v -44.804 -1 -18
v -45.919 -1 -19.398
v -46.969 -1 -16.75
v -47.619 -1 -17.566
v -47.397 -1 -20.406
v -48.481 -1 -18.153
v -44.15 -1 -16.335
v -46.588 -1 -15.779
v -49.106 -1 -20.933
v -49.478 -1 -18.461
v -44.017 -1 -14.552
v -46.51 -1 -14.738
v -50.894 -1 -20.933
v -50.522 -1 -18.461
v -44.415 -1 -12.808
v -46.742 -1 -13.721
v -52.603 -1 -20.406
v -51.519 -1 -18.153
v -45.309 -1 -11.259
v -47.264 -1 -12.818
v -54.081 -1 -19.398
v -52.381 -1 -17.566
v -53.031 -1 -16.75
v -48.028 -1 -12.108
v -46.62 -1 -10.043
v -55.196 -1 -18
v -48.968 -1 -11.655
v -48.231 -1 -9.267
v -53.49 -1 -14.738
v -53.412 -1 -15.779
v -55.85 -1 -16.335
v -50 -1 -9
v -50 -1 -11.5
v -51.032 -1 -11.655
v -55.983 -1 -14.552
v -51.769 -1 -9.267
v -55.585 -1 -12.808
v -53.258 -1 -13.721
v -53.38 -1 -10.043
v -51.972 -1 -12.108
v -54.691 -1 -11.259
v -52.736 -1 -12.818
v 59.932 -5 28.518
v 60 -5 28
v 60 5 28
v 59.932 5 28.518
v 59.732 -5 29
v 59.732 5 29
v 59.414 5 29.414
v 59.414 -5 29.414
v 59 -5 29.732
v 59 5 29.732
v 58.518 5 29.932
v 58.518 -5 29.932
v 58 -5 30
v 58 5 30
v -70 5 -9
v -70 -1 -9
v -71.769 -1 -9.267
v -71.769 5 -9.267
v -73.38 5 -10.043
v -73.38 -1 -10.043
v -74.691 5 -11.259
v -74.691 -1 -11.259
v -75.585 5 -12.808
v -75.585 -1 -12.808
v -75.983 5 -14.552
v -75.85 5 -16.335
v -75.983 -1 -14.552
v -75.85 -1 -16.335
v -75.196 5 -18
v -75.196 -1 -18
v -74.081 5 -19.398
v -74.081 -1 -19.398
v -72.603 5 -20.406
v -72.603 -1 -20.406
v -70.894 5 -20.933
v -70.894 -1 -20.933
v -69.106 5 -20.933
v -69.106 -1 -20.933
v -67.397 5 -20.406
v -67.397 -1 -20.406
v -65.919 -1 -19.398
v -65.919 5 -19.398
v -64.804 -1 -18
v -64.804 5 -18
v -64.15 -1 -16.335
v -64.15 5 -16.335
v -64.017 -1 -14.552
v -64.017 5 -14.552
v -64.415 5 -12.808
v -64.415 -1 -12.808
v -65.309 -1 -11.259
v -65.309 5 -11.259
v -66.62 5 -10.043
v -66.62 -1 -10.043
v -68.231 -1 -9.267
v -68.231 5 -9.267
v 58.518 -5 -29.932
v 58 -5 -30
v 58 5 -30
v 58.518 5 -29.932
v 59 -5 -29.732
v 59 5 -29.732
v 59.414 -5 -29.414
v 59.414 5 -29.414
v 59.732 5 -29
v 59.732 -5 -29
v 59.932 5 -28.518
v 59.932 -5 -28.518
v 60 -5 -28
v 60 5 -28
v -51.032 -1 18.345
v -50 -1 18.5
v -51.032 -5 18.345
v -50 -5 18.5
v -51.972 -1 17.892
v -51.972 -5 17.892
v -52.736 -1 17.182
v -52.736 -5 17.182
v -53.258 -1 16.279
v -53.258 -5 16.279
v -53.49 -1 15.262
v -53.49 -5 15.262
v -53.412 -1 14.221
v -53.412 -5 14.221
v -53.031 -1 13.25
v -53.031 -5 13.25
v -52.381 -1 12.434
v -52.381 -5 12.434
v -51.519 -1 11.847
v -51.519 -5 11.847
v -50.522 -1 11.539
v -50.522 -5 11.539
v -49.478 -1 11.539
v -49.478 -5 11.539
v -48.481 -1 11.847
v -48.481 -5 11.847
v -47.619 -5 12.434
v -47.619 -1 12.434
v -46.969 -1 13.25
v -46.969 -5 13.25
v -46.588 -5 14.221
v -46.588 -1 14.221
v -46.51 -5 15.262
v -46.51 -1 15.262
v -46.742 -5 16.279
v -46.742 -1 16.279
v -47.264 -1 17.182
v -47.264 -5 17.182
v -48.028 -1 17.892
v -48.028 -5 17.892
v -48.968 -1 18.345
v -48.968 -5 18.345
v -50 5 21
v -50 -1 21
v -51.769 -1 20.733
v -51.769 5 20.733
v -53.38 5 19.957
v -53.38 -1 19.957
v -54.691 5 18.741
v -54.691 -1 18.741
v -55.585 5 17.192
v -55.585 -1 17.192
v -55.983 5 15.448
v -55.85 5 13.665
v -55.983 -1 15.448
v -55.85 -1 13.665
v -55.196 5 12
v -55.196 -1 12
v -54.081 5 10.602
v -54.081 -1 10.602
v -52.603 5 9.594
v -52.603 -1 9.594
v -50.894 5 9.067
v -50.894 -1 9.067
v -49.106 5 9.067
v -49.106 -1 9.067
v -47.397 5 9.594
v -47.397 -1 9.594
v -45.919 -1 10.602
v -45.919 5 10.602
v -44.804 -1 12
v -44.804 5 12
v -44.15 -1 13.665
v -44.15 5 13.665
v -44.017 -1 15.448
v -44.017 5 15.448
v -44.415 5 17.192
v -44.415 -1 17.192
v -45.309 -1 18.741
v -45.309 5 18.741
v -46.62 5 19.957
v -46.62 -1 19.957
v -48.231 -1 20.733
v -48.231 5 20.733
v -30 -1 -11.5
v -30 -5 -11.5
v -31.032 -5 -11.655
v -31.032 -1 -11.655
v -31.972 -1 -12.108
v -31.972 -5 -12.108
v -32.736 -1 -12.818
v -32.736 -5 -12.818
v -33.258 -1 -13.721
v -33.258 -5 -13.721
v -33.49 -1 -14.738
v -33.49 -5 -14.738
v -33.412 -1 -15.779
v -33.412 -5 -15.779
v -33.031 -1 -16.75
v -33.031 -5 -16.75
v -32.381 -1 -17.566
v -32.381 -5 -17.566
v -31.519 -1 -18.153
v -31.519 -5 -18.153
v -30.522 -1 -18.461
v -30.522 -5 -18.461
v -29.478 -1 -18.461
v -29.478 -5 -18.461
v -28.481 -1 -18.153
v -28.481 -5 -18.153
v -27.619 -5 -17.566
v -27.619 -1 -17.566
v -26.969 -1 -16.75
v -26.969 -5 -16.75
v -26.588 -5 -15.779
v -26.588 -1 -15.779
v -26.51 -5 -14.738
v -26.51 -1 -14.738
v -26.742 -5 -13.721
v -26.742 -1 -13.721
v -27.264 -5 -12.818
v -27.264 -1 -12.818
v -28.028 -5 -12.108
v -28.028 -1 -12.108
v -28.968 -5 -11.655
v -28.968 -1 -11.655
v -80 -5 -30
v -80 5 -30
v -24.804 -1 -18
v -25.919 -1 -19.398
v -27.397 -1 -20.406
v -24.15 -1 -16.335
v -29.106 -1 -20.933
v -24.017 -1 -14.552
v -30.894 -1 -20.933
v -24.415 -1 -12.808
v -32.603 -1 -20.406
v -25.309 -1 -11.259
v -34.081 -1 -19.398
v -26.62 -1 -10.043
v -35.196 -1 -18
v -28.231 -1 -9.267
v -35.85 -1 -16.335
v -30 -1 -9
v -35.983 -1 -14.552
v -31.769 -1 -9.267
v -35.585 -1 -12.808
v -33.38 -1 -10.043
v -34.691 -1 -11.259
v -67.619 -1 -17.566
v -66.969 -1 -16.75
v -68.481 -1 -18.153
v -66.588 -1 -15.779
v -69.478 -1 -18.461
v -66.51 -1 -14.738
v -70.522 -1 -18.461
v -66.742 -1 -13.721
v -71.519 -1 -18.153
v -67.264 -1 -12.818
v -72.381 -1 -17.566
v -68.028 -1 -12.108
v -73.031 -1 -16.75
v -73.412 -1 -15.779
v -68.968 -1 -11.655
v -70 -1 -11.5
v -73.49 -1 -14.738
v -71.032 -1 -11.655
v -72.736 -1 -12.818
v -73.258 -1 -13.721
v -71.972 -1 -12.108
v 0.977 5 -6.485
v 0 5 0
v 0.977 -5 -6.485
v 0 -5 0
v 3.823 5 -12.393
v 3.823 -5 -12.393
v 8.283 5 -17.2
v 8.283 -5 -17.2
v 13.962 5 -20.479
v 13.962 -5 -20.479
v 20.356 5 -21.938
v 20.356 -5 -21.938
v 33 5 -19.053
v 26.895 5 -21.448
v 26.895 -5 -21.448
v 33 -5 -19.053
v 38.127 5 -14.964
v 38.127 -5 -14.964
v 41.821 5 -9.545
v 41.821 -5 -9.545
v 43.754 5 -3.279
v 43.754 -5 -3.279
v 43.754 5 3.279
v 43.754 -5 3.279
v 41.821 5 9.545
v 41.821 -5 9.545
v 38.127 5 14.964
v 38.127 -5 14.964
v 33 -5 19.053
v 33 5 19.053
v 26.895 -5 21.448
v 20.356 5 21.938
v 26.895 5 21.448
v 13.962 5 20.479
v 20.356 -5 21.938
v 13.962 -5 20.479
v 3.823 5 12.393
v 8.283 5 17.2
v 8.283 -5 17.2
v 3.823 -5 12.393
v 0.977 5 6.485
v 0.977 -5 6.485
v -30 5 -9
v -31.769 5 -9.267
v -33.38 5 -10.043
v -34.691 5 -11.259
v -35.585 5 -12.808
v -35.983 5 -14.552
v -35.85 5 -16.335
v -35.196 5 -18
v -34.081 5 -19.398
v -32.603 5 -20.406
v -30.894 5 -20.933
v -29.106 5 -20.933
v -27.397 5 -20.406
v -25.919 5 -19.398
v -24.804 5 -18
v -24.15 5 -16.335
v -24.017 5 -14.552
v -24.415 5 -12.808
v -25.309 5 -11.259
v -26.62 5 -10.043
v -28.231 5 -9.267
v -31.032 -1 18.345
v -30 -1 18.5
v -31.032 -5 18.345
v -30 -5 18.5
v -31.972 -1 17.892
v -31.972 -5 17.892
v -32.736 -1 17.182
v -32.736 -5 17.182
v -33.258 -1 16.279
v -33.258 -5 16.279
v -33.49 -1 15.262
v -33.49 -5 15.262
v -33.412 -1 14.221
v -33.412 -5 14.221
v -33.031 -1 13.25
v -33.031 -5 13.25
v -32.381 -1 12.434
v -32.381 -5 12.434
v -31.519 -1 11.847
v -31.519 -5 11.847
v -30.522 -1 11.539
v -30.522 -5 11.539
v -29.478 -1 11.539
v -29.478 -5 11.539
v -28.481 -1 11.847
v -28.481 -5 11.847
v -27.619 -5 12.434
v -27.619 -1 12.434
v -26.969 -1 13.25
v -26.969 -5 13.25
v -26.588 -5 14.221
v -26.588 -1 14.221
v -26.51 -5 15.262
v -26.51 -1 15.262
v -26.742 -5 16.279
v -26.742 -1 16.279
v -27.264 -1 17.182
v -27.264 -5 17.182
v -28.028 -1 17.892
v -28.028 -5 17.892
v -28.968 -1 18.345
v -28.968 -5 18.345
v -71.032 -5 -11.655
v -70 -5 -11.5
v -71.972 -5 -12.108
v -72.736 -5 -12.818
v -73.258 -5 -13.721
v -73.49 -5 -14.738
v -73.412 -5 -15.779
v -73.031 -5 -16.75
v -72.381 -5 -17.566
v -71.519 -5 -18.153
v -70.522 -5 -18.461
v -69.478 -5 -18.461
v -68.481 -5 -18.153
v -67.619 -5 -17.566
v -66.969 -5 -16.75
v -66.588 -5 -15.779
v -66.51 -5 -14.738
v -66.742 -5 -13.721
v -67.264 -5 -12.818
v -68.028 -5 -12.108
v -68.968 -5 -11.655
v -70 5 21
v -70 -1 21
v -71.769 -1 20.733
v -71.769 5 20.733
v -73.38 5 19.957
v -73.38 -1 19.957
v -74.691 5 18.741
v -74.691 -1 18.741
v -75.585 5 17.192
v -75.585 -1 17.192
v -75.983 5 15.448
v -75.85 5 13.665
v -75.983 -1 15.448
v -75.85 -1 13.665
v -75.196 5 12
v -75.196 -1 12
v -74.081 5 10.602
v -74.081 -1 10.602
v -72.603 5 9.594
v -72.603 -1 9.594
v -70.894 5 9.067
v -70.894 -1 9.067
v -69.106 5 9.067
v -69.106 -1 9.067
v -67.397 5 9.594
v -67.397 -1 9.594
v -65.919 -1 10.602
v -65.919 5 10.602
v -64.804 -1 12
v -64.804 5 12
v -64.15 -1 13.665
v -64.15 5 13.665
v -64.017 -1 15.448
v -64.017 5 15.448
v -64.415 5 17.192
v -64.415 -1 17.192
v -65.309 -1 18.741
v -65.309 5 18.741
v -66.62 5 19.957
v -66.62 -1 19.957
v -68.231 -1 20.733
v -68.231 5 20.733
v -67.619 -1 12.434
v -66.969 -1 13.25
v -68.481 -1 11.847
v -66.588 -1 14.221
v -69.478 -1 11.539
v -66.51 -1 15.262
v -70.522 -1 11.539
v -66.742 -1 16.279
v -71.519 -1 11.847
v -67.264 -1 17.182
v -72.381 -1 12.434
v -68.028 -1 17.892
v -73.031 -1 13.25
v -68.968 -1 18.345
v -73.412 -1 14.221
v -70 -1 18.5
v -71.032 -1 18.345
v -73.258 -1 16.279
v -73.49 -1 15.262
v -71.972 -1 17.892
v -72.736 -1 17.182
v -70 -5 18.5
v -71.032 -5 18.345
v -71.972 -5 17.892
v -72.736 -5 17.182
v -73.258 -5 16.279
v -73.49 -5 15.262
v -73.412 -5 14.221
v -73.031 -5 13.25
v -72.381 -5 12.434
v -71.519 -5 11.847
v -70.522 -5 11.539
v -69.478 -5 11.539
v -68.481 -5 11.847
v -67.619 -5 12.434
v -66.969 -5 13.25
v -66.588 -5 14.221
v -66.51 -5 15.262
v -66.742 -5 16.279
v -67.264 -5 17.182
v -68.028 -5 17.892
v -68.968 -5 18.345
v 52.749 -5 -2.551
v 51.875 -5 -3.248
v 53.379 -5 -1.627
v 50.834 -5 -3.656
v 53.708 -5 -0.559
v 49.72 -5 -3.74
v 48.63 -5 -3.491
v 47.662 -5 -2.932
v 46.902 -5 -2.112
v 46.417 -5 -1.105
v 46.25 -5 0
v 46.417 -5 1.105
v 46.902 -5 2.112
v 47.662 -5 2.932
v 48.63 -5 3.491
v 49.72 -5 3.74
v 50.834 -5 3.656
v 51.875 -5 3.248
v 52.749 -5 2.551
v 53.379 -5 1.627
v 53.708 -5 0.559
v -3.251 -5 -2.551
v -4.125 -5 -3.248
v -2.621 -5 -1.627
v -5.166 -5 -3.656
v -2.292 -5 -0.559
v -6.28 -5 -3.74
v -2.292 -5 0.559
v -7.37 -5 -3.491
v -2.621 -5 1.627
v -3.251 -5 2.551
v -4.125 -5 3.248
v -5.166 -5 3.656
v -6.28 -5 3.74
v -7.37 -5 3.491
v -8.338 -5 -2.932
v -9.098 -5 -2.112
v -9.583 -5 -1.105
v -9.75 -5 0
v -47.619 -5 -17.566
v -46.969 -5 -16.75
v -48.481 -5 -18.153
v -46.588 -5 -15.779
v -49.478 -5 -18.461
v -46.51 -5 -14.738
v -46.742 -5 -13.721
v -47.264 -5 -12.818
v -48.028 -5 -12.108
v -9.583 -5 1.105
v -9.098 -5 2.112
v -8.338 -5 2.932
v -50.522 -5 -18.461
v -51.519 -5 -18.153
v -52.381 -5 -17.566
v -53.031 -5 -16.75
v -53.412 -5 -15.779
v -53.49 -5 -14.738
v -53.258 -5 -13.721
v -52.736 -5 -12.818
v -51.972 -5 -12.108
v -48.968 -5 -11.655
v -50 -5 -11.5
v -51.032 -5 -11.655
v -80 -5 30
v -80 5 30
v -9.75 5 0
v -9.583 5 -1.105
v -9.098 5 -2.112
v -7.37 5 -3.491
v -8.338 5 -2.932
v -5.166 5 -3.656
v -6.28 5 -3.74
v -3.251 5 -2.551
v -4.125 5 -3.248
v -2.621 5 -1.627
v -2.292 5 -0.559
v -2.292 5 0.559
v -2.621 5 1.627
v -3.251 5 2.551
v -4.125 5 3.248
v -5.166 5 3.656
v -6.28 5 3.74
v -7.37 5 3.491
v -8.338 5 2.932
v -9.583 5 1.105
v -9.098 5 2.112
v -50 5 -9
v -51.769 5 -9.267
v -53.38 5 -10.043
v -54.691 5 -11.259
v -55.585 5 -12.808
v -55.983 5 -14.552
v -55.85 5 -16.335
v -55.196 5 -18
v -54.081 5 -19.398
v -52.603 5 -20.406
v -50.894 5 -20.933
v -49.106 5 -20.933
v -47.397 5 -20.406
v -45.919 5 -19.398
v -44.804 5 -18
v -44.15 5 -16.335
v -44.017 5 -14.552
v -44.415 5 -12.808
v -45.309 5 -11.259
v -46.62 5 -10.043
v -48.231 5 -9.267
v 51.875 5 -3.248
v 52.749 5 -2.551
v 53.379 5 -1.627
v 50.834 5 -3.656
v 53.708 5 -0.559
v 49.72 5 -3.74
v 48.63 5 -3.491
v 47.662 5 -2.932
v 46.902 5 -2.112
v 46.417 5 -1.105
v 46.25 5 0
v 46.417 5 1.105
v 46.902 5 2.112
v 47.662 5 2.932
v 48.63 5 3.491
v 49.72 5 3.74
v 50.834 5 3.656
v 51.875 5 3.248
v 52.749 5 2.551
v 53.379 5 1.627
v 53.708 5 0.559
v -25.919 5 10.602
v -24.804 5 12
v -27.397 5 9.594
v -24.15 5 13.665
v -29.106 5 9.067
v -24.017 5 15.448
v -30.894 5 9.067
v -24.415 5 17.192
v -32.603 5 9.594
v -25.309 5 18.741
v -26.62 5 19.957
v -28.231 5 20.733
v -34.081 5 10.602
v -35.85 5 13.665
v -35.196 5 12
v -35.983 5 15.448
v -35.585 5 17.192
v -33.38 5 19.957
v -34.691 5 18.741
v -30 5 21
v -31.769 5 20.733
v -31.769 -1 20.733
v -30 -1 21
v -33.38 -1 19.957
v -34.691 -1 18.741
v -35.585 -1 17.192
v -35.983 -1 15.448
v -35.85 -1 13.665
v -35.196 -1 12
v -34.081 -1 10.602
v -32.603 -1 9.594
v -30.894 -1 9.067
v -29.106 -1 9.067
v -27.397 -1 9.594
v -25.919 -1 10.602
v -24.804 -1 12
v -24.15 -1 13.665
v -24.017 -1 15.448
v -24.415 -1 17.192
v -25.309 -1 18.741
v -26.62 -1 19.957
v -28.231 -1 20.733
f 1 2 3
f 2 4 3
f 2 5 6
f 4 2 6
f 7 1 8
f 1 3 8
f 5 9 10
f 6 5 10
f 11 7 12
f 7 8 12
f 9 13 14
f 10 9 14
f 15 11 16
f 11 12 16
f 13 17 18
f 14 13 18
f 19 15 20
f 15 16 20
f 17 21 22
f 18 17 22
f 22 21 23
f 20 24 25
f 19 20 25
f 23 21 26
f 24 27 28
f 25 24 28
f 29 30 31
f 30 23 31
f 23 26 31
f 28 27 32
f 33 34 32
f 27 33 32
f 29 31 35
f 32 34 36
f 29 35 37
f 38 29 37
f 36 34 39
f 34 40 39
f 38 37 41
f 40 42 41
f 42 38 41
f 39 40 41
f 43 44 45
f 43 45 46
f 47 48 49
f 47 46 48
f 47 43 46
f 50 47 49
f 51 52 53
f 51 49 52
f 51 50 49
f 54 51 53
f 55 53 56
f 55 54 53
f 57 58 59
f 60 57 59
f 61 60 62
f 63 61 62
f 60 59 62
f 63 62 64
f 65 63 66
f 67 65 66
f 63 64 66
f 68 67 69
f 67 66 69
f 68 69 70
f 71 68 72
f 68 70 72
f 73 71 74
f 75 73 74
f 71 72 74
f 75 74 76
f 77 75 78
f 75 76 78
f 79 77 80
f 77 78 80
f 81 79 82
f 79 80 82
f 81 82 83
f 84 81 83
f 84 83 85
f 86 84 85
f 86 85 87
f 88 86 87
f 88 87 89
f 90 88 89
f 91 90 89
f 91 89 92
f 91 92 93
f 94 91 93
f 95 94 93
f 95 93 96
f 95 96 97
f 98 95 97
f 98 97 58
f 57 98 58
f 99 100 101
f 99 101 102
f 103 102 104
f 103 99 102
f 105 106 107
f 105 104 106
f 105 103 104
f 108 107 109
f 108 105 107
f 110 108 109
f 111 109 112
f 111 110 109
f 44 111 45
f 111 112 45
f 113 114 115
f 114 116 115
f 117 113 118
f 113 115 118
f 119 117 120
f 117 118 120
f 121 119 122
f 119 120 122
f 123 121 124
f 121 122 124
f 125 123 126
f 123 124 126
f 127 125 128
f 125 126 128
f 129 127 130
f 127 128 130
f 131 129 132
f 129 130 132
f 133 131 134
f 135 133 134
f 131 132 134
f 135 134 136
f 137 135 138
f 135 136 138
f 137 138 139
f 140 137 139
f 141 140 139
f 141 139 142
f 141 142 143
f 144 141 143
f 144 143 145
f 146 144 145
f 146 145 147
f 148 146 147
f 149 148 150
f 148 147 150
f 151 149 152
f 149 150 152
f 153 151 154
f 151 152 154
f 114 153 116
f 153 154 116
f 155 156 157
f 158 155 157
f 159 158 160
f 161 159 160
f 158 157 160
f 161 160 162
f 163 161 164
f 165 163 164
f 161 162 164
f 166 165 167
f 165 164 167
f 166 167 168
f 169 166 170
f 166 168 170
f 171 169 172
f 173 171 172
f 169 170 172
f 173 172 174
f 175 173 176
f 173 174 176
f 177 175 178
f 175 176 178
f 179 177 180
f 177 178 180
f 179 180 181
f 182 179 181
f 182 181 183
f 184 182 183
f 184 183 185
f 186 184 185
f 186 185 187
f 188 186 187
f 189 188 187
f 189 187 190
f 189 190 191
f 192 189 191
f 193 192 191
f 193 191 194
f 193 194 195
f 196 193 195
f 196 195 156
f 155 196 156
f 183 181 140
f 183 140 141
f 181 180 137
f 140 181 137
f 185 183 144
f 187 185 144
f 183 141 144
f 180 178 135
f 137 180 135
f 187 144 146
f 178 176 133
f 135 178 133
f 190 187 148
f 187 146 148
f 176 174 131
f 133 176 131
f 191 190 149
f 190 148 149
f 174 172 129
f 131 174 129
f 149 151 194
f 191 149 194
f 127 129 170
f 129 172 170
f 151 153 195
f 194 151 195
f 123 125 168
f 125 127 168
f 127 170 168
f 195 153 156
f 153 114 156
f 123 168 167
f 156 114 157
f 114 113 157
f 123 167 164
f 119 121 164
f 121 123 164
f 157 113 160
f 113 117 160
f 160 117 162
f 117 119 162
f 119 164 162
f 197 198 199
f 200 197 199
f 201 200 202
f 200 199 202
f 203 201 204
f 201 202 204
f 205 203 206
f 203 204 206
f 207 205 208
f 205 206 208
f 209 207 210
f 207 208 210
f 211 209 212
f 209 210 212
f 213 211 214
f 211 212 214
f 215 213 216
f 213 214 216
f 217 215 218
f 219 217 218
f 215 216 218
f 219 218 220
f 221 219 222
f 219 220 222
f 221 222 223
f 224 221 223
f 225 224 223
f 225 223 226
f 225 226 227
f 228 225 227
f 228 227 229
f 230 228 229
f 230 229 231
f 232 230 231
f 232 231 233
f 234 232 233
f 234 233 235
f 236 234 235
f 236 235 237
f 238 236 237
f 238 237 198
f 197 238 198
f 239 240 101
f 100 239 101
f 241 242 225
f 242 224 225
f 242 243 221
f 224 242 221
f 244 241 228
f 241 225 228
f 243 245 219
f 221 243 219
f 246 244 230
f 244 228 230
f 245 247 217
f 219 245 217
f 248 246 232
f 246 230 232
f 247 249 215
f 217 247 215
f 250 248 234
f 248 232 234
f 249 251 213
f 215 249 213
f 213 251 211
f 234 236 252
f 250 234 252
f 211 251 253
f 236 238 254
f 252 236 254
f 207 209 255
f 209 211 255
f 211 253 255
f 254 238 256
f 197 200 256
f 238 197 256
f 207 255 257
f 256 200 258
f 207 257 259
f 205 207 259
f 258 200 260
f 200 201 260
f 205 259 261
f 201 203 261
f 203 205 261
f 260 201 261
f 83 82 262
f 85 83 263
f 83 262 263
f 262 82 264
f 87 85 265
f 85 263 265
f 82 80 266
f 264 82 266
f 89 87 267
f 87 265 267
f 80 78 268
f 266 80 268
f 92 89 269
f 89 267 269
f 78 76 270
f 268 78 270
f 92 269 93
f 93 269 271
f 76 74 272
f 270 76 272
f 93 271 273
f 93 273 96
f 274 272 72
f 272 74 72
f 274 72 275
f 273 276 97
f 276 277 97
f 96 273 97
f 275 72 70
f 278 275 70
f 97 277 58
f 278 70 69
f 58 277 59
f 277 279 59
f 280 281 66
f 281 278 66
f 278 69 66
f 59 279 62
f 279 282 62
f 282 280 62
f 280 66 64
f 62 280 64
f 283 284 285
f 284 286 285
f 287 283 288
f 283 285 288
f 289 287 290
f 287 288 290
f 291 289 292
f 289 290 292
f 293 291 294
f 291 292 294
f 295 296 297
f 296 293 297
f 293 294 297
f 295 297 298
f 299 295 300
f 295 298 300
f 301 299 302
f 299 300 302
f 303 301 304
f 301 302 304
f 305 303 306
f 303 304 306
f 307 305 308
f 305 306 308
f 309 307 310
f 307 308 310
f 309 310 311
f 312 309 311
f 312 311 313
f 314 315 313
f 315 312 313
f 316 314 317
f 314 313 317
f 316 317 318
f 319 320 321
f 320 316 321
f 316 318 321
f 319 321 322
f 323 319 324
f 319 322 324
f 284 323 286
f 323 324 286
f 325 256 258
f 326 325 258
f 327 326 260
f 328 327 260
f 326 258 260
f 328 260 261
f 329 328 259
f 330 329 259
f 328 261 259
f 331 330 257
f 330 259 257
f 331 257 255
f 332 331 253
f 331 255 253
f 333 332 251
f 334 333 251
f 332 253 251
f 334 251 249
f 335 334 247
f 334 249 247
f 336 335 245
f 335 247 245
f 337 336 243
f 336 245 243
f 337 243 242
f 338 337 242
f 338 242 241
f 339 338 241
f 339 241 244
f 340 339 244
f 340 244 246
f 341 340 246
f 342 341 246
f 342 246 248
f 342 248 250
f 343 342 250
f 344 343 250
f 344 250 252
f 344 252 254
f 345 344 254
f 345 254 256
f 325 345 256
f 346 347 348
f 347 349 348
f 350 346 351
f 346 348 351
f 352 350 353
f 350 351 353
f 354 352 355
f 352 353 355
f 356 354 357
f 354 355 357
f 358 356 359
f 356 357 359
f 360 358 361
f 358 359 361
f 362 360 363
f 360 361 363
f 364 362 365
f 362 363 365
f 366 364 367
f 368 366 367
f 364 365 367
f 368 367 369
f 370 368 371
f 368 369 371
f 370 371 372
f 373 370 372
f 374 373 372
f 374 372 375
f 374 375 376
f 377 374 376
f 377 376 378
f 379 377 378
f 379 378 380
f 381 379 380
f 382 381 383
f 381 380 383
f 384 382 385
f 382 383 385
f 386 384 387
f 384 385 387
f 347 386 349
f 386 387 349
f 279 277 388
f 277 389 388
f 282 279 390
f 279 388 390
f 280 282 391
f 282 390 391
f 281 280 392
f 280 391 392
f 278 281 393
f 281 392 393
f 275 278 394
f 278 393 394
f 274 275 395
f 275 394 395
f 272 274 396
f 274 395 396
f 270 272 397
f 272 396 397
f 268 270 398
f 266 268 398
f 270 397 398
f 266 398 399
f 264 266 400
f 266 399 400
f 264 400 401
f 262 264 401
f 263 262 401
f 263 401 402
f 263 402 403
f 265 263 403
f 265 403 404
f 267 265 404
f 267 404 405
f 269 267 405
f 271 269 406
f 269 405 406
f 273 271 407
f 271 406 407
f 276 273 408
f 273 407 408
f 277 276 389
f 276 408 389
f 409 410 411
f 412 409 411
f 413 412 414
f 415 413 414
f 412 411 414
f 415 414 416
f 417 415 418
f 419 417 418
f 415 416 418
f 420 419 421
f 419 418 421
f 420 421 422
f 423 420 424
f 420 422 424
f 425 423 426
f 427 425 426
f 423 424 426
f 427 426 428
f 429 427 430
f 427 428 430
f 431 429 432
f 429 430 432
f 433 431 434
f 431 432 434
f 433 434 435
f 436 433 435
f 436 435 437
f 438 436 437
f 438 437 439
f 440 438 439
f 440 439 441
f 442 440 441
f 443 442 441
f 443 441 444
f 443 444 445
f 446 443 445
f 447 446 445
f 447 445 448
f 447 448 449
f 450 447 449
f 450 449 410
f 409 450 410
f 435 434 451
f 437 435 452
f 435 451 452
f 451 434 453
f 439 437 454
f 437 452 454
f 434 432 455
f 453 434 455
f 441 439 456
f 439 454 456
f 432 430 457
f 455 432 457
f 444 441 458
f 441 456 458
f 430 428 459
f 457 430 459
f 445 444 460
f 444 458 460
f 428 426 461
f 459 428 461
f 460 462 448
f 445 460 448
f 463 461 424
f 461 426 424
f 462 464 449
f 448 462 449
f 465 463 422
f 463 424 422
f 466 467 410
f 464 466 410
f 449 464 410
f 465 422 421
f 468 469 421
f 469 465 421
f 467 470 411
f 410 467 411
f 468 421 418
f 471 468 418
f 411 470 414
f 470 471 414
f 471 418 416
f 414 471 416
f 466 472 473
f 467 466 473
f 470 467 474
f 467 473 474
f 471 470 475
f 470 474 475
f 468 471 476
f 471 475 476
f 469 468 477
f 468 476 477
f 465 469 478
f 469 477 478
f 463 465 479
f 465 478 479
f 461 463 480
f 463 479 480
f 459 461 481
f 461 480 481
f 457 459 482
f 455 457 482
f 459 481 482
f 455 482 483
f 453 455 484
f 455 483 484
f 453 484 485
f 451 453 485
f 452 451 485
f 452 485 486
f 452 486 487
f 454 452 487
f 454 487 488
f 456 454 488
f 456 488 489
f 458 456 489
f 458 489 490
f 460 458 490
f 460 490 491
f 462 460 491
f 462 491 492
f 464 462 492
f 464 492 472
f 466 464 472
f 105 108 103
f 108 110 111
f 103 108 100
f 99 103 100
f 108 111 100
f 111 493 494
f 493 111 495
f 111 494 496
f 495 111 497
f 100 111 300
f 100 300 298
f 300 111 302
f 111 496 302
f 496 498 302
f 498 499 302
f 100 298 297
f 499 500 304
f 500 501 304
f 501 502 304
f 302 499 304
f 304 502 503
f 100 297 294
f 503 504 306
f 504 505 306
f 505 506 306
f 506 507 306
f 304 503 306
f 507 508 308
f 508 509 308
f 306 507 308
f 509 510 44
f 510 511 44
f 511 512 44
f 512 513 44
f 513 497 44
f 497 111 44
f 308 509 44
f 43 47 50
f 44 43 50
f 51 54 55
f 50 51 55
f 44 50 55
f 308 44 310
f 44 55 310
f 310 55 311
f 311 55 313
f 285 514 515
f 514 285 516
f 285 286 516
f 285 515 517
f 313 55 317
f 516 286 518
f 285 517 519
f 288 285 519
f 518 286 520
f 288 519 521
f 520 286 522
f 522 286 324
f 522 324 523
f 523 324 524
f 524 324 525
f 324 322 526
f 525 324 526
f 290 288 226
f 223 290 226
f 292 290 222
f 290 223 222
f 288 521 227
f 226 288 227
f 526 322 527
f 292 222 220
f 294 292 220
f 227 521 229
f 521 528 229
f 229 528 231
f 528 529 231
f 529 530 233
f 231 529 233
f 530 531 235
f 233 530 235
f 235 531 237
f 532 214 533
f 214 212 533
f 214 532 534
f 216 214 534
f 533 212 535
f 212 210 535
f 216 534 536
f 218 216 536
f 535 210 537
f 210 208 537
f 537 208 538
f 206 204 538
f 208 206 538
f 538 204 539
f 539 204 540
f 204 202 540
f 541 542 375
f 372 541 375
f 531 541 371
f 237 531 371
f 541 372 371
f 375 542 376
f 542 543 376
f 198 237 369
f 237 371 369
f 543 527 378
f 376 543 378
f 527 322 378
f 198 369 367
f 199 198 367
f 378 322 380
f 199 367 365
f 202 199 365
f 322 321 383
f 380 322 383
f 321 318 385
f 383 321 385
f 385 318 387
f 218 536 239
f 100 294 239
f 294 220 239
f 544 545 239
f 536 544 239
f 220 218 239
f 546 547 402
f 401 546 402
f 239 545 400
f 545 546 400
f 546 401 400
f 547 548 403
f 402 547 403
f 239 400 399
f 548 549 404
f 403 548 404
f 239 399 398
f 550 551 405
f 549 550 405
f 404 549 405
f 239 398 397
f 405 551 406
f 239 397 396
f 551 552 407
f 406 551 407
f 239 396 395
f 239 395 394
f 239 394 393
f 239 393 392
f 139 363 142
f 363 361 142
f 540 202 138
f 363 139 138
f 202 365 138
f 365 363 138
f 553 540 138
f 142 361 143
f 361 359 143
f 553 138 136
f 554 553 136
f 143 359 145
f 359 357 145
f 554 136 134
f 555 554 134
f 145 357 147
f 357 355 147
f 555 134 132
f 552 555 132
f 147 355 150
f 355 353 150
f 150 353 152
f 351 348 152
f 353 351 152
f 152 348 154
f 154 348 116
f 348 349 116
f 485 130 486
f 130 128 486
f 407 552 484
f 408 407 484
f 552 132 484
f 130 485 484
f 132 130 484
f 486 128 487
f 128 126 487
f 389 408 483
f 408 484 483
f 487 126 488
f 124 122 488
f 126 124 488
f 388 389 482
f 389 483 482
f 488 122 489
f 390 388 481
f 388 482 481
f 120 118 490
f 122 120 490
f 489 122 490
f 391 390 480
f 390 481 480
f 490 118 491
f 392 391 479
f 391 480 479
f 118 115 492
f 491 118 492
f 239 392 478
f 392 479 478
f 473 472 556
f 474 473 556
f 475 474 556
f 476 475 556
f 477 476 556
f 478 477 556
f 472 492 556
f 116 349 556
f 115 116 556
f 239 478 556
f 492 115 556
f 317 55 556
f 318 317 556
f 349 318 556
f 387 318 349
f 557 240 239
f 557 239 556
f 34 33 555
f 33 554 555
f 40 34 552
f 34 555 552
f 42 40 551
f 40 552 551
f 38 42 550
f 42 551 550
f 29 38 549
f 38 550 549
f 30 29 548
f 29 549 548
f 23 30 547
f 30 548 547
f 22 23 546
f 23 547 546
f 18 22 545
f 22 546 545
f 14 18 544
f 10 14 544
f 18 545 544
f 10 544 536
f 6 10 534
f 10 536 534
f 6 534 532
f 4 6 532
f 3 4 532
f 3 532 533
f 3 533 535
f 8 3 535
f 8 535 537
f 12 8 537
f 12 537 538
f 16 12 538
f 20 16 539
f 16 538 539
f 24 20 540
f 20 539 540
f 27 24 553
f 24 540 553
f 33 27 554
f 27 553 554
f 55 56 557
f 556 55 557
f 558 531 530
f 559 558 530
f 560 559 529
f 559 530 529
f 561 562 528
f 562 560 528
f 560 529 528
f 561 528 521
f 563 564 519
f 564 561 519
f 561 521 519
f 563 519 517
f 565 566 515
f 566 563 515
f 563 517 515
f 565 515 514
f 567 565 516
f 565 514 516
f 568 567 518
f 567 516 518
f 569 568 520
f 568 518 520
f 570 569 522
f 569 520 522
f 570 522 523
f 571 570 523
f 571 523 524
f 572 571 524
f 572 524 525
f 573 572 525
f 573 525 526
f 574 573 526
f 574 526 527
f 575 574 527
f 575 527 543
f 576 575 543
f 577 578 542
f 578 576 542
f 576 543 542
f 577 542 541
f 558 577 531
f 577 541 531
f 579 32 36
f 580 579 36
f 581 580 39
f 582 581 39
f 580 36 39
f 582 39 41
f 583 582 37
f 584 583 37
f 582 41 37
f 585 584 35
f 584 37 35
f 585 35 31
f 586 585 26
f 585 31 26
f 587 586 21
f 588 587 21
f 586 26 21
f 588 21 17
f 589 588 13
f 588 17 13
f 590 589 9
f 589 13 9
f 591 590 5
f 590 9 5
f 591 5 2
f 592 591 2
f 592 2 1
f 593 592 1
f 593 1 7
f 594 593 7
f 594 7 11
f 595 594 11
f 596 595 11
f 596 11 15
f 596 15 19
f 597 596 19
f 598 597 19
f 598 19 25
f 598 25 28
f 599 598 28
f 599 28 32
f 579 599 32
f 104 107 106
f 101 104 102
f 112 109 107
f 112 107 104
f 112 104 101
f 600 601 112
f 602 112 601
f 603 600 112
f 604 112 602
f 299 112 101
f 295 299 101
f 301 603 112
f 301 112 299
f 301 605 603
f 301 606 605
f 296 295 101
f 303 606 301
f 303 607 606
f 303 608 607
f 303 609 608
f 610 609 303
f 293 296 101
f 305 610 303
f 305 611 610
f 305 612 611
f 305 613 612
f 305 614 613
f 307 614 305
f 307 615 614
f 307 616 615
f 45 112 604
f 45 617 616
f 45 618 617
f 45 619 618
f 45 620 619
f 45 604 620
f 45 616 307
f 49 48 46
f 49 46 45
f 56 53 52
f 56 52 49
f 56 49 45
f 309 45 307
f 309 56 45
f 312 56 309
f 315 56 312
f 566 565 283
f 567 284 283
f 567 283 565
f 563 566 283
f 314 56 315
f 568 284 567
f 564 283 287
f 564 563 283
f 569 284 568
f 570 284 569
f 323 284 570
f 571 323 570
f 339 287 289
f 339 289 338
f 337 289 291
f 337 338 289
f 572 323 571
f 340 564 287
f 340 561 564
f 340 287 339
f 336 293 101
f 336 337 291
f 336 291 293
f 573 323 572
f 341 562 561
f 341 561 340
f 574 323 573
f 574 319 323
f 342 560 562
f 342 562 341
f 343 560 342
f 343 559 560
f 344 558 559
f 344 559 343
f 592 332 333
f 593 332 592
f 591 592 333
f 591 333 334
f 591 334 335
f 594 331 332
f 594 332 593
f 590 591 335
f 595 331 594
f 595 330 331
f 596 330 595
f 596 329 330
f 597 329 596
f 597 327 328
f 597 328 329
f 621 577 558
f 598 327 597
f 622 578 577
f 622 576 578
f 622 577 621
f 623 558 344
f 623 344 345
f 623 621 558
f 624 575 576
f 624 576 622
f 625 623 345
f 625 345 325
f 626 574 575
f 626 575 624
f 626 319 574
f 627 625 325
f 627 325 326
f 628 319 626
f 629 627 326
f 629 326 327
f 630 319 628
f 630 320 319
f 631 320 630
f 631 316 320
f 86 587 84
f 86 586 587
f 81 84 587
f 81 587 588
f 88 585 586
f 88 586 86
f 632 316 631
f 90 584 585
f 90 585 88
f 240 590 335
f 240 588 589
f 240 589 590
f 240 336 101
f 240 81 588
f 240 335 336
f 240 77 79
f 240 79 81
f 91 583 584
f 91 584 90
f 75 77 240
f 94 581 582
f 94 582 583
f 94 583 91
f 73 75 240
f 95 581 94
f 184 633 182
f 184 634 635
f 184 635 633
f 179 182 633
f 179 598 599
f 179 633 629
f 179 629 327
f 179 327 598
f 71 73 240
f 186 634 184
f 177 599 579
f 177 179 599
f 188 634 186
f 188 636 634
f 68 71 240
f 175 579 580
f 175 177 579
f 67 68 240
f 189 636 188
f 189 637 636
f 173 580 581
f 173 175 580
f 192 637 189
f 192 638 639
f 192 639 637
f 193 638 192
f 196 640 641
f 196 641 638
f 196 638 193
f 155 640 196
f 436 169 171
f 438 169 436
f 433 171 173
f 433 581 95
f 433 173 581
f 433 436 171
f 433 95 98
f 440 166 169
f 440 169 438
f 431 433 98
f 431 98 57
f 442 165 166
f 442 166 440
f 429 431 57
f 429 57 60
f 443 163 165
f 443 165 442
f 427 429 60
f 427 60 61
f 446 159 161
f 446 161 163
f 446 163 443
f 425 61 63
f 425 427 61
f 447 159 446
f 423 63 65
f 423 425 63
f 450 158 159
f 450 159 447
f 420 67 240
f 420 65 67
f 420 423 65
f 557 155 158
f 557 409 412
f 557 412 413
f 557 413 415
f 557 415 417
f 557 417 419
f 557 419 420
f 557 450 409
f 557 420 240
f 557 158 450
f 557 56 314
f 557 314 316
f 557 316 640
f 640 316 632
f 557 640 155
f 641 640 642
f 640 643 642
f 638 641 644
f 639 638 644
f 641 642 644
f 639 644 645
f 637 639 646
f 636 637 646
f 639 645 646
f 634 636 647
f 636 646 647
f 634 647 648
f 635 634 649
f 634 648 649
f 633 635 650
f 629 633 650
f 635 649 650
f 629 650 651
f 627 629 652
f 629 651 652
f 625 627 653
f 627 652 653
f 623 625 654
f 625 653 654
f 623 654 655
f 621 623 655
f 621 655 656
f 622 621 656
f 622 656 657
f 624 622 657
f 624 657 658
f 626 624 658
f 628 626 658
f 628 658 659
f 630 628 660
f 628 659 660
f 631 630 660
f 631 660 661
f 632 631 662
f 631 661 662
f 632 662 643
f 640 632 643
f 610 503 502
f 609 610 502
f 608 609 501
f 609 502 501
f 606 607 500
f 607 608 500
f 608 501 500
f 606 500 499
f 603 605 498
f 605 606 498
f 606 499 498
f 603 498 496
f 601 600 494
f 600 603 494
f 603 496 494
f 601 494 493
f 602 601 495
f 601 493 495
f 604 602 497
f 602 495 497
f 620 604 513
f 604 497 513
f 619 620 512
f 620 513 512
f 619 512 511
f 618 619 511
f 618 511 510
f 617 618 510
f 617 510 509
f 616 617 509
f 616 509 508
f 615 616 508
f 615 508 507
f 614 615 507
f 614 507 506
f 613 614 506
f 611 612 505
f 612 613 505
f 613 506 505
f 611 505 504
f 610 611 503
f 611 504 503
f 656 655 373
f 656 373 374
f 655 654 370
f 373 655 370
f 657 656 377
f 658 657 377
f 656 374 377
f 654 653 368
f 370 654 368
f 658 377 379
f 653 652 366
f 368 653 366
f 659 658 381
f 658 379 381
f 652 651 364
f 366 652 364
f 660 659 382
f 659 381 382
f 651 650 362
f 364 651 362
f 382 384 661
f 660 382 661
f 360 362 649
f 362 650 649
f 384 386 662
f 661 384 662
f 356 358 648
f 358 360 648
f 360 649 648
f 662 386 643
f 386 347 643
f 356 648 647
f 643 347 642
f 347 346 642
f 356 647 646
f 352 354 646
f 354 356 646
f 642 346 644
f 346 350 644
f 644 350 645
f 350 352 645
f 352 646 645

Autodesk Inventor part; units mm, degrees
ref_plane "YZ Plane" through (0, 0, 0) normal (1, 0, 0) x (0, 1, 0)
ref_plane "XZ Plane" through (0, 0, 0) normal (0, 1, 0) x (-1, 0, 0)
ref_plane "XY Plane" through (0, 0, 0) normal (0, 0, 1) x (1, 0, 0)
sketch "Sketch6" plane through (0, -5, 0) normal (0, -1, 0) x (1, 0, 0)
  circle A0 centre (-30, 15) radius 3.25 projected
  circle A1 centre (-30, -15) radius 3.25 projected
  circle A2 centre (-50, -15) radius 3.25 projected
  circle A3 centre (-50, 15) radius 3.25 projected
  circle A4 centre (-70, 15) radius 3.25 projected
  circle A5 centre (-70, -15) radius 3.25 projected
  point P0 (0, 0)
sketch "Sketch1" plane through (0, 0, 0) normal (0, 1, 0) x (-1, 0, 0)
  line L0 (-98, 30) -> (98, 30)
  line L1 (100, 28) -> (100, -28)
  line L2 (98, -30) -> (-98, -30)
  line L3 (-100, -28) -> (-100, 28)
  line L4 (-100, 30) -> (100, -30) construction
  line L5 (100, 30) -> (-100, -30) construction
  arc A0 (-98, 30) -> (-100, 28) centre (-98, 28) ccw
  arc A1 (100, 28) -> (98, 30) centre (98, 28) ccw
  arc A2 (98, -30) -> (100, -28) centre (98, -28) ccw
  arc A3 (-100, -28) -> (-98, -30) centre (-98, -28) ccw
  circle A4 centre (-22, 0) radius 22
  circle A5 centre (-50, 0) radius 3.75
  circle A6 centre (6, 0) radius 3.75
  circle A7 centre (30, 15) radius 3.25
  circle A8 centre (50, 15) radius 3.25
  circle A9 centre (70, 15) radius 3.25
  circle A10 centre (30, -15) radius 3.25
  circle A11 centre (50, -15) radius 3.25
  circle A12 centre (70, -15) radius 3.25
  point P0 (0, 0)
  point P1 (-100, 0)
  dimension "d0" = 60
  dimension "d1" = 200
  dimension "d2" = 2
  dimension "d3" = 44
  dimension "d4" = 56
  dimension "d5" = 28
  dimension "d6" = 7.5
  dimension "d7" = 7.5
  dimension "d8" = 50
  dimension "d9" = 6.5
  dimension "d10" = 6.5
  dimension "d11" = 6.5
  dimension "d12" = 6.5
  dimension "d13" = 6.5
  dimension "d14" = 6.5
  dimension "d15" = 15
  dimension "d16" = 30
  dimension "d17" = 30
  dimension "d18" = 20
  dimension "d19" = 20
extrude "Plate1" add sketch "Sketch1" along normal mid plane 10 contours L0 A1 L1 A2 L2 A3 L3 A0 | A7 | A8 | A9 | A10 | A11 | A12
sketch "Sketch2" plane through (0, 5, 0) normal (0, 1, 0) x (1, 0, 0)
  line L0 (98, -30) -> (-98, -30) projected
  line L1 (100, 30) -> (60, 30)
  line L2 (60, 30) -> (60, -30)
  line L3 (60, -30) -> (100, -30)
  line L4 (100, -30) -> (100, 30)
  line L5 (100, 28) -> (100, -28) projected
  line L6 (-98, 30) -> (98, 30) projected
  point P0 (0, 0)
  dimension "d21" = 40
extrude "Cut1" cut sketch "Sketch2" against normal blind 10
fillet "Corner Round1" radius 2 2 edges at (60, 0, -30) (60, 0, 30)
sketch "Sketch3" plane through (0, 5, 0) normal (0, 1, 0) x (1, 0, 0)
  circle A0 centre (50, 0) radius 3.75 projected
  circle A1 centre (-6, 0) radius 3.75 projected
  point P0 (0, 0)
sketch "Sketch4" plane through (0, 5, 0) normal (0, 1, 0) x (1, 0, 0)
  line L0 (-100, -28) -> (-100, 28) construction
  line L1 (-98, 30) -> (58, 30) construction
  line L2 (58, -30) -> (-98, -30) projected
  line L3 (-100, 30) -> (-80, 30)
  line L4 (-80, 30) -> (-80, -30)
  line L5 (-80, -30) -> (-100, -30)
  line L6 (-100, -30) -> (-100, 30)
  point P0 (0, 0)
  dimension "d25" = 20
extrude "Cut2" cut sketch "Sketch4" against normal blind 10
sketch "Sketch5" plane through (0, 5, 0) normal (0, 1, 0) x (1, 0, 0)
  point P0 (0, 0)
  point P1 (-30, -15)
  point P2 (-30, -15)
  point P3 (-50, -15)
  point P4 (-50, -15)
  point P5 (-70, -15)
  point P6 (-70, -15)
  point P7 (-70, 15)
  point P8 (-70, 15)
  point P9 (-50, 15)
  point P10 (-50, 15)
  point P11 (-30, 15)
  point P12 (-30, 15)
hole "Hole1" at (-70, 5, 15) at (-70, 5, -15) at (-50, 5, -15) at (-30, 5, -15) at (-30, 5, 15) at (-50, 5, 15) direction (0, -1, 0) diameter 7 end through all counterbore diameter 12 counterbore depth 6
equation "\"d7\" = d6"
equation "\"d10\" = d9"
equation "\"d11\" = d9"
equation "\"d12\" = d9"
equation "\"d13\" = d9"
equation "\"d14\" = d9"
equation "\"d22\" = Thickness"
equation "\"d26\" = Thickness"
equation "\"d20\" = Thickness"
equation "\"BendReliefDepth\" = 0.5 * Thickness"
equation "\"Thickness\" = 10"
properties part number "HCMUTE-CDT23-BAT_TRUC_DAN" material "Stainless Steel"
